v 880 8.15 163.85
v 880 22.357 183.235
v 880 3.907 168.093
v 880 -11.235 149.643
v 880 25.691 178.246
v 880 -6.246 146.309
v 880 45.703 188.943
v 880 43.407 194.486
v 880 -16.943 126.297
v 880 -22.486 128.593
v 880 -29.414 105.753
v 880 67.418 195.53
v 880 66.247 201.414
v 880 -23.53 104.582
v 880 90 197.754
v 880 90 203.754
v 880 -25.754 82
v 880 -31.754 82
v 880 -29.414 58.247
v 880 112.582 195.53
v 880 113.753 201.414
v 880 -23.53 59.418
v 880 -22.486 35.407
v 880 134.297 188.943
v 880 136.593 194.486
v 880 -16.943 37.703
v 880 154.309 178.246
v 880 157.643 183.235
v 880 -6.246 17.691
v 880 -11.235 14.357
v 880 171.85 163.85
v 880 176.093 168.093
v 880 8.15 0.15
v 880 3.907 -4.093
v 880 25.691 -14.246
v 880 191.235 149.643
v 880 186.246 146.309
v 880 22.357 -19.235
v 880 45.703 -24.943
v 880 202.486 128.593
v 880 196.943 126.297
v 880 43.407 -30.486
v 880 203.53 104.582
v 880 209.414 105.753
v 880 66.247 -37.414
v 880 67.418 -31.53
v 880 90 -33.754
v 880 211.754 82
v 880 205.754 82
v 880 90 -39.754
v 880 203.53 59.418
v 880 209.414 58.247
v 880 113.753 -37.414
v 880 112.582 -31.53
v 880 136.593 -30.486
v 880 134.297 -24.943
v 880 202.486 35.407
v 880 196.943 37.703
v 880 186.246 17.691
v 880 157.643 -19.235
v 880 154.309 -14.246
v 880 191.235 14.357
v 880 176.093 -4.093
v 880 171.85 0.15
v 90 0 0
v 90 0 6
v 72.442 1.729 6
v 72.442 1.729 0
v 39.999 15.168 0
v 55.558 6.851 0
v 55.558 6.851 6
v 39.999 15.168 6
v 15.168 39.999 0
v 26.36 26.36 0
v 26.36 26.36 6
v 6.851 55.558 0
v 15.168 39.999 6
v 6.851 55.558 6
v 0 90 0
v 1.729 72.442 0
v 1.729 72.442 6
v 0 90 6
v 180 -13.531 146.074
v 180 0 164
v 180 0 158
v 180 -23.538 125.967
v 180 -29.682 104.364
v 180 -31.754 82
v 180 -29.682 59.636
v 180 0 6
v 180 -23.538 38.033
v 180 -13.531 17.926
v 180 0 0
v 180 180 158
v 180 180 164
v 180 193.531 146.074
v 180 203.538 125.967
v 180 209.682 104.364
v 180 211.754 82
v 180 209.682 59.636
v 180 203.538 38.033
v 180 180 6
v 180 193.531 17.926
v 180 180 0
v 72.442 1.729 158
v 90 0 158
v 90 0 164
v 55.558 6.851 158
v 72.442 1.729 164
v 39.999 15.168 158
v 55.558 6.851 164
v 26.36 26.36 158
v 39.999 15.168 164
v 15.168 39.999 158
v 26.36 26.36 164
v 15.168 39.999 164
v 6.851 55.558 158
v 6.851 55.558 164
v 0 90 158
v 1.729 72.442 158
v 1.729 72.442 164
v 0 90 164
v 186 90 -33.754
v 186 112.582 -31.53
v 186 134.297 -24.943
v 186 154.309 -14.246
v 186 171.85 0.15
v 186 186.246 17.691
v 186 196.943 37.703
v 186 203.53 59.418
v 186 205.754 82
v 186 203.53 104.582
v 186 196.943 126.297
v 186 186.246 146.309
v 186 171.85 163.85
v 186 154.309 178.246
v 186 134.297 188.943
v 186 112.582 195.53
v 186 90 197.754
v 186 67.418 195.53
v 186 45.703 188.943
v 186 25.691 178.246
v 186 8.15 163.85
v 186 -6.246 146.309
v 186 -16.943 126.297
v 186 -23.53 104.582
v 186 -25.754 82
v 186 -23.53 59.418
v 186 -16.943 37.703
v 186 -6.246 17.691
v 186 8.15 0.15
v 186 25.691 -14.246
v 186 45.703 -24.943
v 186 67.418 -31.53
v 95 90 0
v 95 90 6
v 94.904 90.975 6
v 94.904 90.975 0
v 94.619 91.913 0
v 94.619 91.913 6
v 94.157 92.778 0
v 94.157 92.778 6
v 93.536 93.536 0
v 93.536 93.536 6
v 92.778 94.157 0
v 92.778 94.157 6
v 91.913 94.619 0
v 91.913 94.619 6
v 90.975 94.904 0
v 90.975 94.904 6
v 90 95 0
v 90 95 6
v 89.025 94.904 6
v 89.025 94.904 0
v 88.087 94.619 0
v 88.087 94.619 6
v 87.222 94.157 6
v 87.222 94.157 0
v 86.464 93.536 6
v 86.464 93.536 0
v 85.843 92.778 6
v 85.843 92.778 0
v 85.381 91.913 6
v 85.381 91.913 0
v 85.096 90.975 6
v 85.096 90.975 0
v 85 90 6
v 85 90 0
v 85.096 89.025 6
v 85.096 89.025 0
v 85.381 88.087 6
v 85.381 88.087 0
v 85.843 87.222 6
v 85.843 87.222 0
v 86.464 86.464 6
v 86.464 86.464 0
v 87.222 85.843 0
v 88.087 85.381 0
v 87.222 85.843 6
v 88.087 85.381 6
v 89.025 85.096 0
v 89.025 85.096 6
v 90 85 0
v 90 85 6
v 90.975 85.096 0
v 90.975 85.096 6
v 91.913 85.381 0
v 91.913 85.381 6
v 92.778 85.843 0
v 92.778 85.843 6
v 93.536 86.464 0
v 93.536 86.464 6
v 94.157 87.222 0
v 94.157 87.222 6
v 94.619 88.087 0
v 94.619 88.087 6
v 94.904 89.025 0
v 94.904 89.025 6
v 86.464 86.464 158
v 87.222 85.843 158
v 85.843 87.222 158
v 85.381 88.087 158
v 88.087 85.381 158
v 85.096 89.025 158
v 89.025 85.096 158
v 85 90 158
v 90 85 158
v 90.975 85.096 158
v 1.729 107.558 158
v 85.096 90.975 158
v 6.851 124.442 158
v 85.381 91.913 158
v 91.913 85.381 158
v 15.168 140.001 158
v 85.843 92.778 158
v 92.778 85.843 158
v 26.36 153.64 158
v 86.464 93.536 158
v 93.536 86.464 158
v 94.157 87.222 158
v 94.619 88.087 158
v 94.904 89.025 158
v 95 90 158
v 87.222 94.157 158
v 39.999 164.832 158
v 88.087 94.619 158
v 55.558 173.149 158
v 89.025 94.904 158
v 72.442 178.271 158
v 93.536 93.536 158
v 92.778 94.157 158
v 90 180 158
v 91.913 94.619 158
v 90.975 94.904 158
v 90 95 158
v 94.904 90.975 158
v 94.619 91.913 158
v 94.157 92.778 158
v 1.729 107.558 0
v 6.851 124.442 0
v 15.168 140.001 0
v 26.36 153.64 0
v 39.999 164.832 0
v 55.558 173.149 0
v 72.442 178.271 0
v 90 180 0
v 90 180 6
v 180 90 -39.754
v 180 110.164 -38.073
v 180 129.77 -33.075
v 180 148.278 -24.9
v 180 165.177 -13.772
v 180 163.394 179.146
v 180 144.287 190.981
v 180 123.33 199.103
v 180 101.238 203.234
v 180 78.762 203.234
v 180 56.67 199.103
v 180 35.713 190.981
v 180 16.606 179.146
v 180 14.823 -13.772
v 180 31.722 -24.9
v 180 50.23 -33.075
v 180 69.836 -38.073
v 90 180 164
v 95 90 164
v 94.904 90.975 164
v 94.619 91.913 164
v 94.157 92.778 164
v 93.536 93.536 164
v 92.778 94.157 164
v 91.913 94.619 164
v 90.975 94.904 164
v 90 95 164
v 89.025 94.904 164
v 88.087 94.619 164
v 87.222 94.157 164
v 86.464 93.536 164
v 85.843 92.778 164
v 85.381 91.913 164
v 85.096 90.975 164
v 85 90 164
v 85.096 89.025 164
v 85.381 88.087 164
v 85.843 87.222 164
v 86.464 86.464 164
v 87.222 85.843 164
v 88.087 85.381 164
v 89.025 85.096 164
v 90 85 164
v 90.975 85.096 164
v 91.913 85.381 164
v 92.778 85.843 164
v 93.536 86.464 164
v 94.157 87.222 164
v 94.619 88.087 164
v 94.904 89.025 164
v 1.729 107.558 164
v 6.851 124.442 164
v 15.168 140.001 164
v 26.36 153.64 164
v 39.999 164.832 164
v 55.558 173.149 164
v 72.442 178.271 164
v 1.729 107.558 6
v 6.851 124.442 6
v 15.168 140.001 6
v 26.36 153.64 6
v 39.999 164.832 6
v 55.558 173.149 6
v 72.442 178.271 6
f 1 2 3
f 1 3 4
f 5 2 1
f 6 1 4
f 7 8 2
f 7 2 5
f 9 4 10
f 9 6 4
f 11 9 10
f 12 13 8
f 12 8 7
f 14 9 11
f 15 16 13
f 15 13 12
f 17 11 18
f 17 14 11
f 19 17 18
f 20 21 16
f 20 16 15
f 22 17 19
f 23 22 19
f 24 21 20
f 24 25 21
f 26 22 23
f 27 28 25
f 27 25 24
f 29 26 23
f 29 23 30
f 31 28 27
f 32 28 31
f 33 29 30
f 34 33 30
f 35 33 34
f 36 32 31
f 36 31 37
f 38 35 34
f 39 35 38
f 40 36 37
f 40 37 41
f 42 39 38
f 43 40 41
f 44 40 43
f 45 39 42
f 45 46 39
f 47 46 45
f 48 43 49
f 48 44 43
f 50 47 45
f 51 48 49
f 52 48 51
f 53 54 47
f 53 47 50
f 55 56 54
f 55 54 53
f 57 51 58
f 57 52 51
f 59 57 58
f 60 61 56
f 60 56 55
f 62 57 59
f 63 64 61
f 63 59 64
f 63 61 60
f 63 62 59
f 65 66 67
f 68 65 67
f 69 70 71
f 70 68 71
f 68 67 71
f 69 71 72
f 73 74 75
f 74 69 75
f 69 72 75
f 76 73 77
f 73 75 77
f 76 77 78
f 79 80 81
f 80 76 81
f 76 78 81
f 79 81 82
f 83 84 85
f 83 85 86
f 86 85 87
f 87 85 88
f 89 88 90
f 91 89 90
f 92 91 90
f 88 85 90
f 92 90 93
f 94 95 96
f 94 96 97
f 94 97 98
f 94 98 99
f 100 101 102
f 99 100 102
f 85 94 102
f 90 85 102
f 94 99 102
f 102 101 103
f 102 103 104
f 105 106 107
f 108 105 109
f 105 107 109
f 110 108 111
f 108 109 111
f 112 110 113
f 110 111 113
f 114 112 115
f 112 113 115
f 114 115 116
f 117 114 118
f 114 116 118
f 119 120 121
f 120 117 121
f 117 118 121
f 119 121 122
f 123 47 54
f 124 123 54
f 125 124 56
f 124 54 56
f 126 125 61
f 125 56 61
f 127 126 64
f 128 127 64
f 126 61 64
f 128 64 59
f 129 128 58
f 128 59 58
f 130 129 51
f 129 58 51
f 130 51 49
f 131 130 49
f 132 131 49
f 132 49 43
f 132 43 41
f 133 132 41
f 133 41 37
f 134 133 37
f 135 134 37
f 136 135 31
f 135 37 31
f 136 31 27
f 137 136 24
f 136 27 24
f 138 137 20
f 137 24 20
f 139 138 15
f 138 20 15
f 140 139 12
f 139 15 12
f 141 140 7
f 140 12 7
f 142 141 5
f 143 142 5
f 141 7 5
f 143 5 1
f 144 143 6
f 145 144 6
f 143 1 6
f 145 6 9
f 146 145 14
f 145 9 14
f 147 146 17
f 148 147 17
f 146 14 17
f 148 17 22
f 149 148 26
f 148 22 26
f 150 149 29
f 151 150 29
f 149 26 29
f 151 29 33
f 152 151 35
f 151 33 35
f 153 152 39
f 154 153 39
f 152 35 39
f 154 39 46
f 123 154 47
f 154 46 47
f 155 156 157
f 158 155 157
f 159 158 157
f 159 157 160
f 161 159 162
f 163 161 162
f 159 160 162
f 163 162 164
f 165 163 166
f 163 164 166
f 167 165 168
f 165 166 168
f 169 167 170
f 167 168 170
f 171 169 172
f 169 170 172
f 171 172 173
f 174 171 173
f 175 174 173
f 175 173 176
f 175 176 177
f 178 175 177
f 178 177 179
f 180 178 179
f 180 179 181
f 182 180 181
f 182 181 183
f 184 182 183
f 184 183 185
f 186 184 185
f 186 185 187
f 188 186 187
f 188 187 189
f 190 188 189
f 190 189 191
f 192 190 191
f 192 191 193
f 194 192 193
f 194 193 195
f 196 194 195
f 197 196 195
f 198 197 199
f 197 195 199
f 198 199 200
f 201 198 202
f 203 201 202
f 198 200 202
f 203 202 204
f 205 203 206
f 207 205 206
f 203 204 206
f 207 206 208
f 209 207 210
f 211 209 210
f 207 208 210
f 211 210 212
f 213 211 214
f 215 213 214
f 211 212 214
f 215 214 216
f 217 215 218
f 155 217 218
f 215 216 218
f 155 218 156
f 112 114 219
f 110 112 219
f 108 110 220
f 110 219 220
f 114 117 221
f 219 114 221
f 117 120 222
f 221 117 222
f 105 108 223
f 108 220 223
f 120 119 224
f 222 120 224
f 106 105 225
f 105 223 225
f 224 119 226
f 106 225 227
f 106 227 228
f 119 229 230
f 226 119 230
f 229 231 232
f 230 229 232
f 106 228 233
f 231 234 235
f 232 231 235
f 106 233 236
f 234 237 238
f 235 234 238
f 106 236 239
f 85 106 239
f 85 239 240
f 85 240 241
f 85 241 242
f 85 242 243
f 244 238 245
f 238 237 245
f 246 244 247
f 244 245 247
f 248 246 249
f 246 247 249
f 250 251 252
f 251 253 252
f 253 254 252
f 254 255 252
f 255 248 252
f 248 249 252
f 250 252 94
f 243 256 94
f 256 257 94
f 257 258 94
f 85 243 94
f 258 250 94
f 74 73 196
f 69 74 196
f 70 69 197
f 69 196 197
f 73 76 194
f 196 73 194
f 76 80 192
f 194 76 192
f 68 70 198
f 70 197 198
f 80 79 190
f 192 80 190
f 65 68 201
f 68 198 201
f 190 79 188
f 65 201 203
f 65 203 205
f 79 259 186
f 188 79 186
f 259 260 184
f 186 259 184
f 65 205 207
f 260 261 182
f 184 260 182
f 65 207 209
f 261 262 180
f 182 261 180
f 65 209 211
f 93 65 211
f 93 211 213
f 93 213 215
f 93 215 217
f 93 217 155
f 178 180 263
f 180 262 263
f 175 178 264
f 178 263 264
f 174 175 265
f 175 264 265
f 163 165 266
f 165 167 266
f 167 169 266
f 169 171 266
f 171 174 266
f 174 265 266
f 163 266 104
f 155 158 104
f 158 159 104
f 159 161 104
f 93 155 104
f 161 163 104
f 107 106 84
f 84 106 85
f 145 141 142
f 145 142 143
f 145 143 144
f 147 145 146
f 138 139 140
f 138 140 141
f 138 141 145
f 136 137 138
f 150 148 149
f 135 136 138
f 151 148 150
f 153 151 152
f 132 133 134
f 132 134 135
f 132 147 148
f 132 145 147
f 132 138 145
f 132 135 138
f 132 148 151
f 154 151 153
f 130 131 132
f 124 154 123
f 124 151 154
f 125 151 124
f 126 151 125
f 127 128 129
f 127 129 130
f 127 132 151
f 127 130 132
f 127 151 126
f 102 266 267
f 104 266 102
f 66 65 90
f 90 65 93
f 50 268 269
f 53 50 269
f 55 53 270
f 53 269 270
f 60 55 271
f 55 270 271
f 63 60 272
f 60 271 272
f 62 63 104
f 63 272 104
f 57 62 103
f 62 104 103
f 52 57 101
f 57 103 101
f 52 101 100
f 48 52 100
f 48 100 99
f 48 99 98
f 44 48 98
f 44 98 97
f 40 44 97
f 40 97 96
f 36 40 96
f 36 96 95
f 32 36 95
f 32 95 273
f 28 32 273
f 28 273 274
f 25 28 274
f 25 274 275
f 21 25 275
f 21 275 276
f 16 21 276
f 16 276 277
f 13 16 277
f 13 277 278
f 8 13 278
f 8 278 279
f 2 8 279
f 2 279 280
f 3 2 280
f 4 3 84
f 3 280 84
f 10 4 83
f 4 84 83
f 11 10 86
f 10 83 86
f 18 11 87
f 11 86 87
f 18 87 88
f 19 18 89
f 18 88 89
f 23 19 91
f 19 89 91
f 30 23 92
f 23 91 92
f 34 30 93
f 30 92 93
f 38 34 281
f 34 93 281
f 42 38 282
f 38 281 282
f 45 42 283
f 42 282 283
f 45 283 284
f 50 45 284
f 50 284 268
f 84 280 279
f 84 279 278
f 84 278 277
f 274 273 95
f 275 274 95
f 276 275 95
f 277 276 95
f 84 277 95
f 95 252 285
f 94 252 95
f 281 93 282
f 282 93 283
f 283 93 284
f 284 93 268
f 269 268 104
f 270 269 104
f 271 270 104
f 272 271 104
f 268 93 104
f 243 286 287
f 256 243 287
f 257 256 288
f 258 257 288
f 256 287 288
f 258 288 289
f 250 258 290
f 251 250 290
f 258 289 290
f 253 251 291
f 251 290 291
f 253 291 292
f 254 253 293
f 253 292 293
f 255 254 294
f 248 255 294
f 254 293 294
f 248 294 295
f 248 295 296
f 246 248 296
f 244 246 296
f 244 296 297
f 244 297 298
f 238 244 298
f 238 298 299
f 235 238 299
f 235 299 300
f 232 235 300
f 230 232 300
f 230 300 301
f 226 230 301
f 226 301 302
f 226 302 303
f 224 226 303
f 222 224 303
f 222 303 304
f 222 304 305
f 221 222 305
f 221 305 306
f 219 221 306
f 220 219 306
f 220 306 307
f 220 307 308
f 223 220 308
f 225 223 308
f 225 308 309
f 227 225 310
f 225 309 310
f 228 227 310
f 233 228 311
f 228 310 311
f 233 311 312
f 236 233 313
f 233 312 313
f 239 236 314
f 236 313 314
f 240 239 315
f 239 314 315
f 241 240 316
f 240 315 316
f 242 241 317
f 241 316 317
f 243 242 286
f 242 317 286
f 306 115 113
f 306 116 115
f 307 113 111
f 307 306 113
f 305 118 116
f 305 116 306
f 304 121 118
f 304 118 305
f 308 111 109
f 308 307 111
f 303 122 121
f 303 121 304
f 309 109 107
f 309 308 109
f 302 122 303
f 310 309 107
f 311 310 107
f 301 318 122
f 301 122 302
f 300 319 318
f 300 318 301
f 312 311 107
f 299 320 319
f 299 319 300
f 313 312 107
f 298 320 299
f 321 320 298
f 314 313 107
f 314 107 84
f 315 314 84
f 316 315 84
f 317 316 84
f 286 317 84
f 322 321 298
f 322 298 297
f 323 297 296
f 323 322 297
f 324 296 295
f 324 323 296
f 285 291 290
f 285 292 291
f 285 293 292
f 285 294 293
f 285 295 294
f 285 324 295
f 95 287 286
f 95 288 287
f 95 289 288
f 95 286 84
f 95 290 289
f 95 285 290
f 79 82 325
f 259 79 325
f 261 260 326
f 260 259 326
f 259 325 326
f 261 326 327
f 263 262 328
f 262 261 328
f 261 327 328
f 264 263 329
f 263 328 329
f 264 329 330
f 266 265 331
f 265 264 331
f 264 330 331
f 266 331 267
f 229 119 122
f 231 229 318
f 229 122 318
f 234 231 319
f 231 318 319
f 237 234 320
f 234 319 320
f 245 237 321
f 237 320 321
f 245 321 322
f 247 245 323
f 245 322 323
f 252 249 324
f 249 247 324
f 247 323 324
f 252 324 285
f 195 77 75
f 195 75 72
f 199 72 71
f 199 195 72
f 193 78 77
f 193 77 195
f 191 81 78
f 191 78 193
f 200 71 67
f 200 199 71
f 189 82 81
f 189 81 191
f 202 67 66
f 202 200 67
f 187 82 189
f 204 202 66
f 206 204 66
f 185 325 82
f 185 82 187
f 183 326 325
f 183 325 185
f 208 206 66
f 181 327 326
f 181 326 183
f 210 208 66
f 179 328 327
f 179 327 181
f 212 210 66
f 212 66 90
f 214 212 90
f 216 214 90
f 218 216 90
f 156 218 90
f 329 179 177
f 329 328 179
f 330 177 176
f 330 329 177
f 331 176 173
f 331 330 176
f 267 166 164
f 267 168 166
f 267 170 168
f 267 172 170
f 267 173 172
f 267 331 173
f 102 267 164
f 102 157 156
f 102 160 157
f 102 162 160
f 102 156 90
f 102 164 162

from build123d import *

# Parameters (mm, degrees)
IZIM1_W                     = 180
IZIM1_H                     = 180
Y_KSEKLIK_EKSTR_ZYON1_DEPTH = 164
IZIM3_R                     = 121.753850042
Y_KSEKLIK_EKSTR_ZYON2_DEPTH = 700
KES_EKSTR_ZYON1_DEPTH       = 700
IZIM5_W                     = 180
IZIM5_H                     = 152
KES_EKSTR_ZYON2_DEPTH       = 700
IZIM6_R                     = 5
KES_EKSTR_ZYON3_DEPTH       = 700
IZIM7_R                     = 115.753850042
KES_EKSTR_ZYON4_DEPTH       = 694


with BuildPart() as part:
    # Çizim1 → Yükseklik-Ekstrüzyon1 (new body)
    with BuildSketch(Plane.XY):
        with Locations((90, 90)):
            Rectangle(IZIM1_W, IZIM1_H)
    extrude(amount=Y_KSEKLIK_EKSTR_ZYON1_DEPTH)

    # Çizim3 → Yükseklik-Ekstrüzyon2 (add)
    with BuildSketch(Plane(origin=(180, 0, 0), x_dir=(0, 0, -1), z_dir=(1, 0, 0))):
        with Locations((-82, 90)):
            Circle(IZIM3_R)
    extrude(amount=Y_KSEKLIK_EKSTR_ZYON2_DEPTH)

    # Çizim4 → Kes-Ekstrüzyon1 (cut)
    with BuildSketch(Plane.XY.offset(164)):
        with BuildLine():
            ThreePointArc((0, 90), (26.360389693, 153.639610307), (90, 180))
            Line((90, 180), (0, 180))
            Line((0, 180), (0, 90))
        make_face()
        with BuildLine():
            ThreePointArc((90, 0), (26.360389693, 26.360389693), (0, 90))
            Line((0, 90), (0, 0))
            Line((0, 0), (90, 0))
        make_face()
    extrude(amount=-KES_EKSTR_ZYON1_DEPTH, mode=Mode.SUBTRACT)

    # Çizim5 → Kes-Ekstrüzyon2 (cut)
    with BuildSketch(Plane(origin=(0, 180, 0), x_dir=(1, 0, 0), z_dir=(0, 1, 0))):
        with Locations((90, -82)):
            Rectangle(IZIM5_W, IZIM5_H)
    extrude(amount=-KES_EKSTR_ZYON2_DEPTH, mode=Mode.SUBTRACT)

    # Çizim6 → Kes-Ekstrüzyon3 (cut)
    with BuildSketch(Plane.XY.offset(164)):
        with Locations((90, 90)):
            Circle(IZIM6_R)
    extrude(amount=-KES_EKSTR_ZYON3_DEPTH, mode=Mode.SUBTRACT)

    # Çizim7 → Kes-Ekstrüzyon4 (cut)
    with BuildSketch(Plane(origin=(880, 0, 0), x_dir=(0, 0, -1), z_dir=(1, 0, 0))):
        with Locations((-82, 90)):
            Circle(IZIM7_R)
    extrude(amount=-KES_EKSTR_ZYON4_DEPTH, mode=Mode.SUBTRACT)


solid = part.part
